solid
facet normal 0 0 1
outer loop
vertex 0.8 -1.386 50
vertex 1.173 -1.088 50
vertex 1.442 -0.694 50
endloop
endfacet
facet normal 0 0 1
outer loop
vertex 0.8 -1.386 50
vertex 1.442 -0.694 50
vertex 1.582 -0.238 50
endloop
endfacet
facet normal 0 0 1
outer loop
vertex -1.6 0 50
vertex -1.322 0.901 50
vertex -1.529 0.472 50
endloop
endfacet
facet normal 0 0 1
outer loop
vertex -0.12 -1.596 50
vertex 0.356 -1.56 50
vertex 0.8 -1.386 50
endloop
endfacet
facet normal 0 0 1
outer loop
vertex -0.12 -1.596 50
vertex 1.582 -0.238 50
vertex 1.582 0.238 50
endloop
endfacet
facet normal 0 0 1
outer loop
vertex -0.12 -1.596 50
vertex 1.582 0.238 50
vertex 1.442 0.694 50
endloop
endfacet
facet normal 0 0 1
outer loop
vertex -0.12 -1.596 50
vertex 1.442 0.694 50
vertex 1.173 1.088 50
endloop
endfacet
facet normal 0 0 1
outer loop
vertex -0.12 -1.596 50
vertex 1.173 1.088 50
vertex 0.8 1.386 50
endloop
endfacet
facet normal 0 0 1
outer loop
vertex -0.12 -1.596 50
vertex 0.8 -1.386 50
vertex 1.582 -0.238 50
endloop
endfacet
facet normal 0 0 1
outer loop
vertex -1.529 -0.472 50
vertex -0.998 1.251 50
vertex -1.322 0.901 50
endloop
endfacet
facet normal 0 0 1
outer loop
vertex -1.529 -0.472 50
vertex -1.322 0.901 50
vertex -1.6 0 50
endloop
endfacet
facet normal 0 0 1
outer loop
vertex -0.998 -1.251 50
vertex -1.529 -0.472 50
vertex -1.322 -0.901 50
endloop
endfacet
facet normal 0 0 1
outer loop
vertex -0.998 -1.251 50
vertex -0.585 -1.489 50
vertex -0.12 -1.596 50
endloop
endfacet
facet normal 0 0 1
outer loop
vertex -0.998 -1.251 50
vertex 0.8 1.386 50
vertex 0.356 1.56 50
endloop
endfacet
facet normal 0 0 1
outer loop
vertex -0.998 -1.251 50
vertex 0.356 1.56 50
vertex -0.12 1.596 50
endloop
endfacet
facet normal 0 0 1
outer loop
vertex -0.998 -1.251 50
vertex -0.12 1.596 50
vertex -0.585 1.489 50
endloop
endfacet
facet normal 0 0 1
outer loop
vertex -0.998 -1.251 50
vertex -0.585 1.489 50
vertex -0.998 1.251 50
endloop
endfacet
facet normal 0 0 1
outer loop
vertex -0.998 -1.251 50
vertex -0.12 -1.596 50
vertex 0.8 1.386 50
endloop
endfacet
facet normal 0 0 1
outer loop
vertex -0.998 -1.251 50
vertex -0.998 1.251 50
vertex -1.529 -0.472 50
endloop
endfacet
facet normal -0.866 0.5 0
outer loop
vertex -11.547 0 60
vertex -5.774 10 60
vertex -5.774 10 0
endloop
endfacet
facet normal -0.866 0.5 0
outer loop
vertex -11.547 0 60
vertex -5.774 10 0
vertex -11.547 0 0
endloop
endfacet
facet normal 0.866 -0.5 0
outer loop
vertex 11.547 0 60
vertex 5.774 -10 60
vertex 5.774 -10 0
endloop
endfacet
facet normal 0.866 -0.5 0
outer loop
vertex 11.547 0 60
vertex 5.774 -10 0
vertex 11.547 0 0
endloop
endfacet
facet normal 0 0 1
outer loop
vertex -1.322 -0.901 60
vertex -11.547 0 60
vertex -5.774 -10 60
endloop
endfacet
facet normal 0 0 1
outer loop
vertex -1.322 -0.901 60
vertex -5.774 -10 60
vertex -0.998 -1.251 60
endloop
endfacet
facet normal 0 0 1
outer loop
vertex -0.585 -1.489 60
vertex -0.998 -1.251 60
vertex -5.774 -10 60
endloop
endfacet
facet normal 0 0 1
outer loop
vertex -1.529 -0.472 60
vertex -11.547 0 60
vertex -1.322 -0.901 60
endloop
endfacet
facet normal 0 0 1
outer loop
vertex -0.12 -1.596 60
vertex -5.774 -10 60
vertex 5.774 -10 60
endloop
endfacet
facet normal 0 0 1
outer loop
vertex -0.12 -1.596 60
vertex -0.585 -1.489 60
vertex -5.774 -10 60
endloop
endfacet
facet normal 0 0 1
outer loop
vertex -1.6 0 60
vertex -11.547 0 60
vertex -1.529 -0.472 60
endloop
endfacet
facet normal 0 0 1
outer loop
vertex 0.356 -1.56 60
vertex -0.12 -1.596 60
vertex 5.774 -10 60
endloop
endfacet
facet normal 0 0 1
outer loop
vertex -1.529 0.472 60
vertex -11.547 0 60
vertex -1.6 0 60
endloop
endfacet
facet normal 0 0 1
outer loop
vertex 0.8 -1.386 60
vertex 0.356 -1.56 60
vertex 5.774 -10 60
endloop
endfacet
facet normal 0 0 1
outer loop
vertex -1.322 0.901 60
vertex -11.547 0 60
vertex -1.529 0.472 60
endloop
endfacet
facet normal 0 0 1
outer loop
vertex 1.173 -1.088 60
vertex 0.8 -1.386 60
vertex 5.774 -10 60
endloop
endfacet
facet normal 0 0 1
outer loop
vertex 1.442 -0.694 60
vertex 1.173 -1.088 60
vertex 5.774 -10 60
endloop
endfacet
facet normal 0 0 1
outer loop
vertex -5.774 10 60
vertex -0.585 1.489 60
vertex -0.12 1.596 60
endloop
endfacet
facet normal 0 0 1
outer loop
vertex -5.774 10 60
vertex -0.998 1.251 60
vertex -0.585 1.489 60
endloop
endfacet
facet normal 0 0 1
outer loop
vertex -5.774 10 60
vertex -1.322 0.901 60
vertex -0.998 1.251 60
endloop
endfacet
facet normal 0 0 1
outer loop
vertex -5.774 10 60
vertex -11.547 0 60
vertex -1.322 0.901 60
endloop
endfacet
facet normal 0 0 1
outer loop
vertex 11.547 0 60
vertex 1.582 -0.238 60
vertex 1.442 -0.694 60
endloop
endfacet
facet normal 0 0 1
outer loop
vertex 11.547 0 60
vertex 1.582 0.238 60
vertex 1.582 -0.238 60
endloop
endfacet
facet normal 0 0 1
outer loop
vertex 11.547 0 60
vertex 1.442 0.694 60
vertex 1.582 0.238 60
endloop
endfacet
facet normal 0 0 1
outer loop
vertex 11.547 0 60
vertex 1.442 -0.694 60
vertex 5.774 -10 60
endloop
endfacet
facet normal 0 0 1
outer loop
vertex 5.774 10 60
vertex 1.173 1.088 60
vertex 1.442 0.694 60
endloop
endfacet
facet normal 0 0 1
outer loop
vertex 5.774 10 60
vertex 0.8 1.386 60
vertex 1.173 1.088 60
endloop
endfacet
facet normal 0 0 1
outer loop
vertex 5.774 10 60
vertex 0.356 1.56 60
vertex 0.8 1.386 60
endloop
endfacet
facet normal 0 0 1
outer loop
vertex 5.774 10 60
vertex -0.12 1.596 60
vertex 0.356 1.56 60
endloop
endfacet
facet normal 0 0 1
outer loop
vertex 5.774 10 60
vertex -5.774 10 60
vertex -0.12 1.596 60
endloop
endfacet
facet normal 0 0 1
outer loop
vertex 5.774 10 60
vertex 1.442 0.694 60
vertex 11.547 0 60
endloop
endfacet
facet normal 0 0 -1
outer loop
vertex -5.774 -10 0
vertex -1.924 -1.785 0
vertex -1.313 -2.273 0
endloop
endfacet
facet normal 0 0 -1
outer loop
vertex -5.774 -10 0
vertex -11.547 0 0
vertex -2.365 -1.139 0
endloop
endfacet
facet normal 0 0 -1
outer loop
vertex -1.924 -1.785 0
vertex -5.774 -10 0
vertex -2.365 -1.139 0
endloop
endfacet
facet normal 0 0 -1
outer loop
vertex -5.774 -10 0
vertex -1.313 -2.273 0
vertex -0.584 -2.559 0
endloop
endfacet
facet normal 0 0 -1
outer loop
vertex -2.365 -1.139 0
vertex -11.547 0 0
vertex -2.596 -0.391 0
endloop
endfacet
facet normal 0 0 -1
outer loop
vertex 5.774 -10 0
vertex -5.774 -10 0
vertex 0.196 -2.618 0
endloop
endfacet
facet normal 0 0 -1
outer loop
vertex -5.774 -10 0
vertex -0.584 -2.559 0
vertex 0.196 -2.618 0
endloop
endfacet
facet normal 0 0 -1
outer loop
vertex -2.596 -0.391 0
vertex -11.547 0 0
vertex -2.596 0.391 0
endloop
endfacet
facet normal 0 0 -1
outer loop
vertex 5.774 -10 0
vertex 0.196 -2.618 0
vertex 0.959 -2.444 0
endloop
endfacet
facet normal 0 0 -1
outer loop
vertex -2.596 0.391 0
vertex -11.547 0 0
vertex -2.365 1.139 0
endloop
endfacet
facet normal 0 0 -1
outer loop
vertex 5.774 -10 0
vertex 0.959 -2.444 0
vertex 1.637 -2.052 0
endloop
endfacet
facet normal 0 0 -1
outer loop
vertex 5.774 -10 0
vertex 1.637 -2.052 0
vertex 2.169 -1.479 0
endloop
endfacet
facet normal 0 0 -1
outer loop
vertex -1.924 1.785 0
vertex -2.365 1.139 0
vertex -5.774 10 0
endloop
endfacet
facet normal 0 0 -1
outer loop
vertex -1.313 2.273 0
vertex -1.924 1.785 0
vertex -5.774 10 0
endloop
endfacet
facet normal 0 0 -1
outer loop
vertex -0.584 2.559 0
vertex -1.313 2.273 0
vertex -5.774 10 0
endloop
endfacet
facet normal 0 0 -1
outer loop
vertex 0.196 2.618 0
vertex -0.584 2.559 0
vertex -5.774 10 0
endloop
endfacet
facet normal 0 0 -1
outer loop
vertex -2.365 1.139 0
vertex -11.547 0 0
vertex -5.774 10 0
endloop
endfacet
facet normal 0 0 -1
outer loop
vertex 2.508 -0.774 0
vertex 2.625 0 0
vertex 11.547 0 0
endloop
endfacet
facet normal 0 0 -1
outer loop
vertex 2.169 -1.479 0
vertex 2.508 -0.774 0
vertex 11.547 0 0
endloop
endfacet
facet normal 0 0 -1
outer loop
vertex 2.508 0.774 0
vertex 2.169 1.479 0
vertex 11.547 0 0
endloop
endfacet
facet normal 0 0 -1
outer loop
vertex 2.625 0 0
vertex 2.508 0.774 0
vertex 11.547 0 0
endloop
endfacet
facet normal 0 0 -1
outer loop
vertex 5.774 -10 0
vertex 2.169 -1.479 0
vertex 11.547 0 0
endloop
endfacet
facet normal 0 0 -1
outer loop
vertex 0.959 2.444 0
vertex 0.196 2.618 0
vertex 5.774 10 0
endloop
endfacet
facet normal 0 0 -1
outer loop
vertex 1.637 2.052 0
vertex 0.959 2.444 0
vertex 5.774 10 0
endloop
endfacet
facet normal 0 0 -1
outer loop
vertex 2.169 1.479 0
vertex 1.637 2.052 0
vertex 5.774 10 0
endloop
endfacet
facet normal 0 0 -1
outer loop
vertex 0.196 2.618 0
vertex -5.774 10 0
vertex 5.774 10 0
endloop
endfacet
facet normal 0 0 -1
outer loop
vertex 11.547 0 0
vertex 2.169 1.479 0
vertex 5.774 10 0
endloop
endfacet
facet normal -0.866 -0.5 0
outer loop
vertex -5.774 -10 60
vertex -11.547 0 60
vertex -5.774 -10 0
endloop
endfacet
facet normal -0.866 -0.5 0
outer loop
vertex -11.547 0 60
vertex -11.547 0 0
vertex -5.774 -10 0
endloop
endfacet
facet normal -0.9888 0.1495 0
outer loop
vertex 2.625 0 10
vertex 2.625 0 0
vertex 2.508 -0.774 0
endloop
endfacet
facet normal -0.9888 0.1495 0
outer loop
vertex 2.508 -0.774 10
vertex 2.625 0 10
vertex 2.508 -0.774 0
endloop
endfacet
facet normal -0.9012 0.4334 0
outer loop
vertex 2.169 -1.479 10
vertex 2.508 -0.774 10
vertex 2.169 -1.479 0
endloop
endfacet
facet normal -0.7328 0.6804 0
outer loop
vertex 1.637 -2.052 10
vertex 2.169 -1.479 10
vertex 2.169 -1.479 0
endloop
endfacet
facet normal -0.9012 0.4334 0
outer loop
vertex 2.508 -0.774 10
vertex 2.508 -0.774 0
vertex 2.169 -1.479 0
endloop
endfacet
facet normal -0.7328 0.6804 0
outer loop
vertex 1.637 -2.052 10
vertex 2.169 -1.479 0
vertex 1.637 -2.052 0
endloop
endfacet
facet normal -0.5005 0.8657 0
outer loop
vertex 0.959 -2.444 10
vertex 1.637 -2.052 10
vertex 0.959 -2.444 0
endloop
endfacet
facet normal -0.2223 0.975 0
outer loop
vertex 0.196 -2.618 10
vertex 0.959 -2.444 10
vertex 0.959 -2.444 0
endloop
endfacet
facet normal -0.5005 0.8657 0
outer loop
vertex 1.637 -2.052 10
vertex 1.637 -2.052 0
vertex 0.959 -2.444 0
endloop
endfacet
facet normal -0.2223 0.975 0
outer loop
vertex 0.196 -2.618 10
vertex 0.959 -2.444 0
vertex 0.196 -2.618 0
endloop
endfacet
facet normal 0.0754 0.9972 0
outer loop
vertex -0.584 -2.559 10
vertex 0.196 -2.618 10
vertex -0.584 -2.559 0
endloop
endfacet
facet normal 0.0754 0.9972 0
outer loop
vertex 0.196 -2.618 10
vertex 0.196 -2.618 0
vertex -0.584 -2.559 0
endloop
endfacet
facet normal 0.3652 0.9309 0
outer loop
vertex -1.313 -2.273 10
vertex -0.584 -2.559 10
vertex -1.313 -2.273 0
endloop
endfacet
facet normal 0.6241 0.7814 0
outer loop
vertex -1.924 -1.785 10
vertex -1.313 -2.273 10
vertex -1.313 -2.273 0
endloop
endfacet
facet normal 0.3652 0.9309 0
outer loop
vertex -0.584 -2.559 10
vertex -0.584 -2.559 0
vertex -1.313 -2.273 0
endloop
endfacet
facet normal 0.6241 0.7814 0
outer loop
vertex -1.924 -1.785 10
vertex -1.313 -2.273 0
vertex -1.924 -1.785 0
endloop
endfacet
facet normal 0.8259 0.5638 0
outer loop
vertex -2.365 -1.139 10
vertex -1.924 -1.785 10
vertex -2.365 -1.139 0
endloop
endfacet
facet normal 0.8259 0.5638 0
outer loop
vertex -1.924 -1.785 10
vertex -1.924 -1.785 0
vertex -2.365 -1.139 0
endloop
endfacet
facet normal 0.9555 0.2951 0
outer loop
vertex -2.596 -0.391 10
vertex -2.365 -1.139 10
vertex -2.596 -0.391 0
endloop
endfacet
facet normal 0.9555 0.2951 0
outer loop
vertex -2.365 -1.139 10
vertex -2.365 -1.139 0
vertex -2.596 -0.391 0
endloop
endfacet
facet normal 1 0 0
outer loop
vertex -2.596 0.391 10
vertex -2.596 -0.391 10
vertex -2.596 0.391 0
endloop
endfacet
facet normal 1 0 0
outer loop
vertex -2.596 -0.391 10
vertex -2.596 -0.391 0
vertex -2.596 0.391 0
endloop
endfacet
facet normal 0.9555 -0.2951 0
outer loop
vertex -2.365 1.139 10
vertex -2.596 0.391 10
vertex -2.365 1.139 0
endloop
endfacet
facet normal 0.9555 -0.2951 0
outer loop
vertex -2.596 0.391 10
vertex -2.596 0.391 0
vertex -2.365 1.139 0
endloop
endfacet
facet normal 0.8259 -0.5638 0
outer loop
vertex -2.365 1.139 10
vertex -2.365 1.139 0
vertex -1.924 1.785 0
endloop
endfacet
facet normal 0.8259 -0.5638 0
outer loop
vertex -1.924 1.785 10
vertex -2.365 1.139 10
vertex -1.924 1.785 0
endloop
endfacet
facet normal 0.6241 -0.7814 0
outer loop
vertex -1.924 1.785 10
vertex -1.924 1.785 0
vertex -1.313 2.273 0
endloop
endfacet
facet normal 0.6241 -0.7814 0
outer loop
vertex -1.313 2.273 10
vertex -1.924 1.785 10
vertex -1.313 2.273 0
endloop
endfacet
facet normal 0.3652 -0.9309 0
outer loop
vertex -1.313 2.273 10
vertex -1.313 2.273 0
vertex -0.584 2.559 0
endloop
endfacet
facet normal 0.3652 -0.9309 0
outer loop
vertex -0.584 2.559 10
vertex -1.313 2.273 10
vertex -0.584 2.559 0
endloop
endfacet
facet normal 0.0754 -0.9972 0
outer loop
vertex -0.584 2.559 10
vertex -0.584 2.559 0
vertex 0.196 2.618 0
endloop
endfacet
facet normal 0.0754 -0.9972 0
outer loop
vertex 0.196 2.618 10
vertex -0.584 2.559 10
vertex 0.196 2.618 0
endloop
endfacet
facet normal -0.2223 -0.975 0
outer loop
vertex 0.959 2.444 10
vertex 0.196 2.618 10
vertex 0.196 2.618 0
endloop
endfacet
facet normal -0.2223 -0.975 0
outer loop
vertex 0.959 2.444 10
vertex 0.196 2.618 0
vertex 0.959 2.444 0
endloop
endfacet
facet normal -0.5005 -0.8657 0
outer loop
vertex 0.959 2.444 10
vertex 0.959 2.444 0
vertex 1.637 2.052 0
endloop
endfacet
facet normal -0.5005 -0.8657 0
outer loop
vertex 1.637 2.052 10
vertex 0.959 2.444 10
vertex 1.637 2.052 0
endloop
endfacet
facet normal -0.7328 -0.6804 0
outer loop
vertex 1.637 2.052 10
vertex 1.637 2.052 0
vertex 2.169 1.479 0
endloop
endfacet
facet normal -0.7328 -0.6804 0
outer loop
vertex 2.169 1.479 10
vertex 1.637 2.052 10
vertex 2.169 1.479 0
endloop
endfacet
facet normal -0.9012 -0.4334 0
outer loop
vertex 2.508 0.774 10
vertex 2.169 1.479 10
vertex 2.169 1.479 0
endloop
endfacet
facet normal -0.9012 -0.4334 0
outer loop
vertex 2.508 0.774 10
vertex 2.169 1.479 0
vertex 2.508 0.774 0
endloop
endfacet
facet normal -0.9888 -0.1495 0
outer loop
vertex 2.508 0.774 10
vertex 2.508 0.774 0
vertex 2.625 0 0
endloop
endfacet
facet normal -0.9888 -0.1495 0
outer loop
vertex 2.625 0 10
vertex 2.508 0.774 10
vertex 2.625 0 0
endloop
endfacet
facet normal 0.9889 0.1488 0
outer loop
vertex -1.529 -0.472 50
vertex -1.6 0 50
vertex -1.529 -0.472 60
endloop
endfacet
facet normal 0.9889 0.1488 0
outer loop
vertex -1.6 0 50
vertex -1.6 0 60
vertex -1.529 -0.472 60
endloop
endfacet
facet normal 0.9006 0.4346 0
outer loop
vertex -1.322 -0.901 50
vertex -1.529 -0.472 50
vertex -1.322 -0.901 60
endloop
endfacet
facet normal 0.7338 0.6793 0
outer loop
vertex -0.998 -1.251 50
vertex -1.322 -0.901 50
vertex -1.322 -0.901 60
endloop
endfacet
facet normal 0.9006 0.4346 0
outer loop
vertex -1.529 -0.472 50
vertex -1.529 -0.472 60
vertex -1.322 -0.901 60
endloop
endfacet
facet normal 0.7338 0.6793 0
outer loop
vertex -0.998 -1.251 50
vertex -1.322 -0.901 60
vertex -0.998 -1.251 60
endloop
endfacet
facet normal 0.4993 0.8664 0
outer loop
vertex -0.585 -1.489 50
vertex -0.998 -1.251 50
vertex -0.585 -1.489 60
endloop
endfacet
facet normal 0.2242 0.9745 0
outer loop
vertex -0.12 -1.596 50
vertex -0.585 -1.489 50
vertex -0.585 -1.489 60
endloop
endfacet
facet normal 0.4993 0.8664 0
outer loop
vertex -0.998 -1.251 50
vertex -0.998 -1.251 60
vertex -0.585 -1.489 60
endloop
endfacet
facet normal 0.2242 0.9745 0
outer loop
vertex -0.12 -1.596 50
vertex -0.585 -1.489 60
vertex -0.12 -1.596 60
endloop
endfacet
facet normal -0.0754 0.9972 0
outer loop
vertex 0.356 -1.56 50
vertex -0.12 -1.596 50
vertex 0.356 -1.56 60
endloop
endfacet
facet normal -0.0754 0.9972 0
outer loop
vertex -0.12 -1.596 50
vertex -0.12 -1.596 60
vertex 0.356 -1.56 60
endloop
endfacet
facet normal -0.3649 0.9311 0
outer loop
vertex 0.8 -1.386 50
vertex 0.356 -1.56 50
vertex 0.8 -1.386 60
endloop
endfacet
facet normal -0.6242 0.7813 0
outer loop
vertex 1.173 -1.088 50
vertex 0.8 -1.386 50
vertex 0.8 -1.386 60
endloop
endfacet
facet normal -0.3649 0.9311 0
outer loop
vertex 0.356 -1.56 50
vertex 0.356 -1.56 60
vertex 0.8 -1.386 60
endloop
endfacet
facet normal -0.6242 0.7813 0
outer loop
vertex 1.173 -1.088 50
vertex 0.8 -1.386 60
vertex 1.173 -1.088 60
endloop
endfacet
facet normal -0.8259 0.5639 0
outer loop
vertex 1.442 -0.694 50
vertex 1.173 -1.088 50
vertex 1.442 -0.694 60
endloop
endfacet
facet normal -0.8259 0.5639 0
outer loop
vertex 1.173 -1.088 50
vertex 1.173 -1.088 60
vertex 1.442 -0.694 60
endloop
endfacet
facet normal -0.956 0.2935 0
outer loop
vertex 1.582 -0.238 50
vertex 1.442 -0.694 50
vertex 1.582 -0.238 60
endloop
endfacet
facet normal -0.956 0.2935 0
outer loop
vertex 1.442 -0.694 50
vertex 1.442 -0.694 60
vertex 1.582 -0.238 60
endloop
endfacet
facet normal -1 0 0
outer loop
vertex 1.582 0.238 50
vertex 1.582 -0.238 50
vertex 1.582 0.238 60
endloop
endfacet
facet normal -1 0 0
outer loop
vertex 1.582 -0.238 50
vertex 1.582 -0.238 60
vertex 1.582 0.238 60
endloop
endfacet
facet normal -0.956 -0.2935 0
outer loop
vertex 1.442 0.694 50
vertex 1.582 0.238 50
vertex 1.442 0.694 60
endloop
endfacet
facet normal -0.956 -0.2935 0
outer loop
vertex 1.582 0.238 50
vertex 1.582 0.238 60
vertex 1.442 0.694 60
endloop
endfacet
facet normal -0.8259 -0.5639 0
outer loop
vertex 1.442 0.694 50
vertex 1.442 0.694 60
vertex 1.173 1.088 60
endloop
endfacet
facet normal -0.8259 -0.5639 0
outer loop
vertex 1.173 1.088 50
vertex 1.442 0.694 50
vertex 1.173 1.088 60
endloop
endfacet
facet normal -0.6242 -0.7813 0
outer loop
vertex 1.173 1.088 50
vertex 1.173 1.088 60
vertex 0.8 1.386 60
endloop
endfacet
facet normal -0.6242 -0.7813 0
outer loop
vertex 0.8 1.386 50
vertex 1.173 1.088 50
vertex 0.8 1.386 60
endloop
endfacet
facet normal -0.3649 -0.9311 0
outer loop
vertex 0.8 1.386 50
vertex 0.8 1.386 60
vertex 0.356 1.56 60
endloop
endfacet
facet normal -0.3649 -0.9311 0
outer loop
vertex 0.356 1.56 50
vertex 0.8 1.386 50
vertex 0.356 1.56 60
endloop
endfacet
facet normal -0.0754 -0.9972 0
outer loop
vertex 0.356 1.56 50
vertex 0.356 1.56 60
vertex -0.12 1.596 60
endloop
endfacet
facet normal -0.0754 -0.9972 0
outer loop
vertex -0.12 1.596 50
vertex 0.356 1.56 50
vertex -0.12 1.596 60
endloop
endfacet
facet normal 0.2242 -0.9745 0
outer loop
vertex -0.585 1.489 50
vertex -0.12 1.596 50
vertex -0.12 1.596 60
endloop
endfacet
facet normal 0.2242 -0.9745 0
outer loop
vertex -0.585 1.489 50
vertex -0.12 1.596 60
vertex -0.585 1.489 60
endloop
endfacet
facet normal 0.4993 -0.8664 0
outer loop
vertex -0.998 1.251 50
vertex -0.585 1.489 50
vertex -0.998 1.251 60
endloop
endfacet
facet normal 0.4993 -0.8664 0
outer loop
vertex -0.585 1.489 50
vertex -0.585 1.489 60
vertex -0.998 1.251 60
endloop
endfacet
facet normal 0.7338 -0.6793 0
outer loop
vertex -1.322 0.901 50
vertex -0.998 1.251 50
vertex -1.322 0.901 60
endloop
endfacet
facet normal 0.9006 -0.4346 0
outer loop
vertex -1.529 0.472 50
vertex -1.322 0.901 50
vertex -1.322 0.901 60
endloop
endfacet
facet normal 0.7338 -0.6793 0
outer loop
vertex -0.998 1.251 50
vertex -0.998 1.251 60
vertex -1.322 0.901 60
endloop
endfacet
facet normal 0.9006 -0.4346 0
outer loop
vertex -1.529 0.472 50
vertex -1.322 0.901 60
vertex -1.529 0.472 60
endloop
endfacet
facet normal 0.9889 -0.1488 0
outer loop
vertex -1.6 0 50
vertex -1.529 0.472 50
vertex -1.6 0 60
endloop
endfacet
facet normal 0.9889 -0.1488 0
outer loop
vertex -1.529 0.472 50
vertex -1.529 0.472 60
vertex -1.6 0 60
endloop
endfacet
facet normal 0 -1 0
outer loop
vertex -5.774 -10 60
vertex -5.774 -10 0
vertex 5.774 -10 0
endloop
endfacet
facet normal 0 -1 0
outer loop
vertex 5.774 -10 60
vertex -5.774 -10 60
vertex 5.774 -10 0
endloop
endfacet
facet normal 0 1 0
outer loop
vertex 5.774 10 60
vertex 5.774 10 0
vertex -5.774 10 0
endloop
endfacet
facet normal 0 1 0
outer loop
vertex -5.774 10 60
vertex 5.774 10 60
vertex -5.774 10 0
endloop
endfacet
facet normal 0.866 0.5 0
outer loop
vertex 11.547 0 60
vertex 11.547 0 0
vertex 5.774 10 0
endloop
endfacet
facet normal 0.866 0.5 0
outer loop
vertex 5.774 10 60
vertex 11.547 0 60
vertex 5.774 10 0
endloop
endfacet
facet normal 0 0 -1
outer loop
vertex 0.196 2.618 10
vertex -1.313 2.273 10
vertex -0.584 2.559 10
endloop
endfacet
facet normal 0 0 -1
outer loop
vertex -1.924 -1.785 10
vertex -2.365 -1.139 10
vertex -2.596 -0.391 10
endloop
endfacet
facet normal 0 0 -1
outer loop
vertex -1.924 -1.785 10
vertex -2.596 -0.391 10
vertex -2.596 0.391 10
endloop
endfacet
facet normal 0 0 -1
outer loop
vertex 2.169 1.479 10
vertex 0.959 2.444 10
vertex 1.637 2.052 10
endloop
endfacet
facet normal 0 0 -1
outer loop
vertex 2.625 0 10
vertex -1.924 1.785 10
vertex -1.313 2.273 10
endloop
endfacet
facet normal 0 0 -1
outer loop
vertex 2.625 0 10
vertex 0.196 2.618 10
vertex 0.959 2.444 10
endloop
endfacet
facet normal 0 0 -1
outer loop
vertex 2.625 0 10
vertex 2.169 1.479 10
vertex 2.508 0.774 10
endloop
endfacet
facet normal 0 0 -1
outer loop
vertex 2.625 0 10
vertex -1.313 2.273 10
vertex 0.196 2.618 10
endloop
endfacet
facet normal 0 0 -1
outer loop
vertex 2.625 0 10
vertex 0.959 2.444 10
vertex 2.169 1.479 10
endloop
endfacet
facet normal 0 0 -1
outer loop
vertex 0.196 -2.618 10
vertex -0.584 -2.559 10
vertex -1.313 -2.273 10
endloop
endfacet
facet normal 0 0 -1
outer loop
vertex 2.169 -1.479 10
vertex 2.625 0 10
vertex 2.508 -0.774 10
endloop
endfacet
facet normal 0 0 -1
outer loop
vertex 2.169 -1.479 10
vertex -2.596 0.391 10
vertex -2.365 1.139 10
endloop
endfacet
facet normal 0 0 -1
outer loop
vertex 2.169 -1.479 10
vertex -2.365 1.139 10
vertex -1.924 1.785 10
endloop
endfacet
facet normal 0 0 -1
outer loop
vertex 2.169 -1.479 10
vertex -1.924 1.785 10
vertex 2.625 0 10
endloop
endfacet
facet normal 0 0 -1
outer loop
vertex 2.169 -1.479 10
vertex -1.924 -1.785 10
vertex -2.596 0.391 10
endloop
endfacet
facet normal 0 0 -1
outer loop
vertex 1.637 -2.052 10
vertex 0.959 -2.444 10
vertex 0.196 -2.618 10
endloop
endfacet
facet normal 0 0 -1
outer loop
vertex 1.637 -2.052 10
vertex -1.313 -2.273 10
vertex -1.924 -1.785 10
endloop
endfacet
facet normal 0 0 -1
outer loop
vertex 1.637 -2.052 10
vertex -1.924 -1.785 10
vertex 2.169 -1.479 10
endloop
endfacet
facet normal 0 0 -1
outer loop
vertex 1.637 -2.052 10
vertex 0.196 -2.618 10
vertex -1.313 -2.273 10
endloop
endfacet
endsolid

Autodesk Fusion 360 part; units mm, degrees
sketch "Sketch1" plane through (0, 0, 0) normal (0, 0, 1) x (1, 0, 0)
  line L0 (-5.7735, 10) -> (-11.547, 0)
  line L1 (-11.547, 0) -> (-5.7735, -10)
  line L2 (-5.7735, -10) -> (5.7735, -10)
  line L3 (5.7735, -10) -> (11.547, 0)
  line L4 (11.547, 0) -> (5.7735, 10)
  line L5 (5.7735, 10) -> (-5.7735, 10)
  dimension "d1" = 10
extrude "Extrude1" add sketch "Sketch1" along normal blind 60
sketch "Sketch2" plane through (0, 0, 60) normal (0, 0, 1) x (-1, 0, 0)
  line L0 (-5.7735, -10) -> (5.7735, -10)
  line L1 (5.7735, -10) -> (11.547, 0)
  line L2 (11.547, 0) -> (5.7735, 10)
  line L3 (5.7735, 10) -> (-5.7735, 10)
  line L4 (-5.7735, 10) -> (-11.547, 0)
  line L5 (-11.547, 0) -> (-5.7735, -10)
  circle A0 centre (0, 0) radius 1.6
  dimension "d4" = 3.2
extrude "Extrude3" cut sketch "Sketch2" against normal blind 10 contours A0
sketch "Sketch4" plane through (0, 0, 0) normal (0, 0, -1) x (1, 0, 0)
  line L0 (-5.7735, -10) -> (5.7735, -10)
  line L1 (5.7735, -10) -> (11.547, 0)
  line L2 (11.547, 0) -> (5.7735, 10)
  line L3 (5.7735, 10) -> (-5.7735, 10)
  line L4 (-5.7735, 10) -> (-11.547, 0)
  line L5 (-11.547, 0) -> (-5.7735, -10)
  circle A0 centre (0, 0) radius 2.625
  dimension "d9" = 5.25
extrude "Extrude4" cut sketch "Sketch4" against normal blind 10 contours A0
